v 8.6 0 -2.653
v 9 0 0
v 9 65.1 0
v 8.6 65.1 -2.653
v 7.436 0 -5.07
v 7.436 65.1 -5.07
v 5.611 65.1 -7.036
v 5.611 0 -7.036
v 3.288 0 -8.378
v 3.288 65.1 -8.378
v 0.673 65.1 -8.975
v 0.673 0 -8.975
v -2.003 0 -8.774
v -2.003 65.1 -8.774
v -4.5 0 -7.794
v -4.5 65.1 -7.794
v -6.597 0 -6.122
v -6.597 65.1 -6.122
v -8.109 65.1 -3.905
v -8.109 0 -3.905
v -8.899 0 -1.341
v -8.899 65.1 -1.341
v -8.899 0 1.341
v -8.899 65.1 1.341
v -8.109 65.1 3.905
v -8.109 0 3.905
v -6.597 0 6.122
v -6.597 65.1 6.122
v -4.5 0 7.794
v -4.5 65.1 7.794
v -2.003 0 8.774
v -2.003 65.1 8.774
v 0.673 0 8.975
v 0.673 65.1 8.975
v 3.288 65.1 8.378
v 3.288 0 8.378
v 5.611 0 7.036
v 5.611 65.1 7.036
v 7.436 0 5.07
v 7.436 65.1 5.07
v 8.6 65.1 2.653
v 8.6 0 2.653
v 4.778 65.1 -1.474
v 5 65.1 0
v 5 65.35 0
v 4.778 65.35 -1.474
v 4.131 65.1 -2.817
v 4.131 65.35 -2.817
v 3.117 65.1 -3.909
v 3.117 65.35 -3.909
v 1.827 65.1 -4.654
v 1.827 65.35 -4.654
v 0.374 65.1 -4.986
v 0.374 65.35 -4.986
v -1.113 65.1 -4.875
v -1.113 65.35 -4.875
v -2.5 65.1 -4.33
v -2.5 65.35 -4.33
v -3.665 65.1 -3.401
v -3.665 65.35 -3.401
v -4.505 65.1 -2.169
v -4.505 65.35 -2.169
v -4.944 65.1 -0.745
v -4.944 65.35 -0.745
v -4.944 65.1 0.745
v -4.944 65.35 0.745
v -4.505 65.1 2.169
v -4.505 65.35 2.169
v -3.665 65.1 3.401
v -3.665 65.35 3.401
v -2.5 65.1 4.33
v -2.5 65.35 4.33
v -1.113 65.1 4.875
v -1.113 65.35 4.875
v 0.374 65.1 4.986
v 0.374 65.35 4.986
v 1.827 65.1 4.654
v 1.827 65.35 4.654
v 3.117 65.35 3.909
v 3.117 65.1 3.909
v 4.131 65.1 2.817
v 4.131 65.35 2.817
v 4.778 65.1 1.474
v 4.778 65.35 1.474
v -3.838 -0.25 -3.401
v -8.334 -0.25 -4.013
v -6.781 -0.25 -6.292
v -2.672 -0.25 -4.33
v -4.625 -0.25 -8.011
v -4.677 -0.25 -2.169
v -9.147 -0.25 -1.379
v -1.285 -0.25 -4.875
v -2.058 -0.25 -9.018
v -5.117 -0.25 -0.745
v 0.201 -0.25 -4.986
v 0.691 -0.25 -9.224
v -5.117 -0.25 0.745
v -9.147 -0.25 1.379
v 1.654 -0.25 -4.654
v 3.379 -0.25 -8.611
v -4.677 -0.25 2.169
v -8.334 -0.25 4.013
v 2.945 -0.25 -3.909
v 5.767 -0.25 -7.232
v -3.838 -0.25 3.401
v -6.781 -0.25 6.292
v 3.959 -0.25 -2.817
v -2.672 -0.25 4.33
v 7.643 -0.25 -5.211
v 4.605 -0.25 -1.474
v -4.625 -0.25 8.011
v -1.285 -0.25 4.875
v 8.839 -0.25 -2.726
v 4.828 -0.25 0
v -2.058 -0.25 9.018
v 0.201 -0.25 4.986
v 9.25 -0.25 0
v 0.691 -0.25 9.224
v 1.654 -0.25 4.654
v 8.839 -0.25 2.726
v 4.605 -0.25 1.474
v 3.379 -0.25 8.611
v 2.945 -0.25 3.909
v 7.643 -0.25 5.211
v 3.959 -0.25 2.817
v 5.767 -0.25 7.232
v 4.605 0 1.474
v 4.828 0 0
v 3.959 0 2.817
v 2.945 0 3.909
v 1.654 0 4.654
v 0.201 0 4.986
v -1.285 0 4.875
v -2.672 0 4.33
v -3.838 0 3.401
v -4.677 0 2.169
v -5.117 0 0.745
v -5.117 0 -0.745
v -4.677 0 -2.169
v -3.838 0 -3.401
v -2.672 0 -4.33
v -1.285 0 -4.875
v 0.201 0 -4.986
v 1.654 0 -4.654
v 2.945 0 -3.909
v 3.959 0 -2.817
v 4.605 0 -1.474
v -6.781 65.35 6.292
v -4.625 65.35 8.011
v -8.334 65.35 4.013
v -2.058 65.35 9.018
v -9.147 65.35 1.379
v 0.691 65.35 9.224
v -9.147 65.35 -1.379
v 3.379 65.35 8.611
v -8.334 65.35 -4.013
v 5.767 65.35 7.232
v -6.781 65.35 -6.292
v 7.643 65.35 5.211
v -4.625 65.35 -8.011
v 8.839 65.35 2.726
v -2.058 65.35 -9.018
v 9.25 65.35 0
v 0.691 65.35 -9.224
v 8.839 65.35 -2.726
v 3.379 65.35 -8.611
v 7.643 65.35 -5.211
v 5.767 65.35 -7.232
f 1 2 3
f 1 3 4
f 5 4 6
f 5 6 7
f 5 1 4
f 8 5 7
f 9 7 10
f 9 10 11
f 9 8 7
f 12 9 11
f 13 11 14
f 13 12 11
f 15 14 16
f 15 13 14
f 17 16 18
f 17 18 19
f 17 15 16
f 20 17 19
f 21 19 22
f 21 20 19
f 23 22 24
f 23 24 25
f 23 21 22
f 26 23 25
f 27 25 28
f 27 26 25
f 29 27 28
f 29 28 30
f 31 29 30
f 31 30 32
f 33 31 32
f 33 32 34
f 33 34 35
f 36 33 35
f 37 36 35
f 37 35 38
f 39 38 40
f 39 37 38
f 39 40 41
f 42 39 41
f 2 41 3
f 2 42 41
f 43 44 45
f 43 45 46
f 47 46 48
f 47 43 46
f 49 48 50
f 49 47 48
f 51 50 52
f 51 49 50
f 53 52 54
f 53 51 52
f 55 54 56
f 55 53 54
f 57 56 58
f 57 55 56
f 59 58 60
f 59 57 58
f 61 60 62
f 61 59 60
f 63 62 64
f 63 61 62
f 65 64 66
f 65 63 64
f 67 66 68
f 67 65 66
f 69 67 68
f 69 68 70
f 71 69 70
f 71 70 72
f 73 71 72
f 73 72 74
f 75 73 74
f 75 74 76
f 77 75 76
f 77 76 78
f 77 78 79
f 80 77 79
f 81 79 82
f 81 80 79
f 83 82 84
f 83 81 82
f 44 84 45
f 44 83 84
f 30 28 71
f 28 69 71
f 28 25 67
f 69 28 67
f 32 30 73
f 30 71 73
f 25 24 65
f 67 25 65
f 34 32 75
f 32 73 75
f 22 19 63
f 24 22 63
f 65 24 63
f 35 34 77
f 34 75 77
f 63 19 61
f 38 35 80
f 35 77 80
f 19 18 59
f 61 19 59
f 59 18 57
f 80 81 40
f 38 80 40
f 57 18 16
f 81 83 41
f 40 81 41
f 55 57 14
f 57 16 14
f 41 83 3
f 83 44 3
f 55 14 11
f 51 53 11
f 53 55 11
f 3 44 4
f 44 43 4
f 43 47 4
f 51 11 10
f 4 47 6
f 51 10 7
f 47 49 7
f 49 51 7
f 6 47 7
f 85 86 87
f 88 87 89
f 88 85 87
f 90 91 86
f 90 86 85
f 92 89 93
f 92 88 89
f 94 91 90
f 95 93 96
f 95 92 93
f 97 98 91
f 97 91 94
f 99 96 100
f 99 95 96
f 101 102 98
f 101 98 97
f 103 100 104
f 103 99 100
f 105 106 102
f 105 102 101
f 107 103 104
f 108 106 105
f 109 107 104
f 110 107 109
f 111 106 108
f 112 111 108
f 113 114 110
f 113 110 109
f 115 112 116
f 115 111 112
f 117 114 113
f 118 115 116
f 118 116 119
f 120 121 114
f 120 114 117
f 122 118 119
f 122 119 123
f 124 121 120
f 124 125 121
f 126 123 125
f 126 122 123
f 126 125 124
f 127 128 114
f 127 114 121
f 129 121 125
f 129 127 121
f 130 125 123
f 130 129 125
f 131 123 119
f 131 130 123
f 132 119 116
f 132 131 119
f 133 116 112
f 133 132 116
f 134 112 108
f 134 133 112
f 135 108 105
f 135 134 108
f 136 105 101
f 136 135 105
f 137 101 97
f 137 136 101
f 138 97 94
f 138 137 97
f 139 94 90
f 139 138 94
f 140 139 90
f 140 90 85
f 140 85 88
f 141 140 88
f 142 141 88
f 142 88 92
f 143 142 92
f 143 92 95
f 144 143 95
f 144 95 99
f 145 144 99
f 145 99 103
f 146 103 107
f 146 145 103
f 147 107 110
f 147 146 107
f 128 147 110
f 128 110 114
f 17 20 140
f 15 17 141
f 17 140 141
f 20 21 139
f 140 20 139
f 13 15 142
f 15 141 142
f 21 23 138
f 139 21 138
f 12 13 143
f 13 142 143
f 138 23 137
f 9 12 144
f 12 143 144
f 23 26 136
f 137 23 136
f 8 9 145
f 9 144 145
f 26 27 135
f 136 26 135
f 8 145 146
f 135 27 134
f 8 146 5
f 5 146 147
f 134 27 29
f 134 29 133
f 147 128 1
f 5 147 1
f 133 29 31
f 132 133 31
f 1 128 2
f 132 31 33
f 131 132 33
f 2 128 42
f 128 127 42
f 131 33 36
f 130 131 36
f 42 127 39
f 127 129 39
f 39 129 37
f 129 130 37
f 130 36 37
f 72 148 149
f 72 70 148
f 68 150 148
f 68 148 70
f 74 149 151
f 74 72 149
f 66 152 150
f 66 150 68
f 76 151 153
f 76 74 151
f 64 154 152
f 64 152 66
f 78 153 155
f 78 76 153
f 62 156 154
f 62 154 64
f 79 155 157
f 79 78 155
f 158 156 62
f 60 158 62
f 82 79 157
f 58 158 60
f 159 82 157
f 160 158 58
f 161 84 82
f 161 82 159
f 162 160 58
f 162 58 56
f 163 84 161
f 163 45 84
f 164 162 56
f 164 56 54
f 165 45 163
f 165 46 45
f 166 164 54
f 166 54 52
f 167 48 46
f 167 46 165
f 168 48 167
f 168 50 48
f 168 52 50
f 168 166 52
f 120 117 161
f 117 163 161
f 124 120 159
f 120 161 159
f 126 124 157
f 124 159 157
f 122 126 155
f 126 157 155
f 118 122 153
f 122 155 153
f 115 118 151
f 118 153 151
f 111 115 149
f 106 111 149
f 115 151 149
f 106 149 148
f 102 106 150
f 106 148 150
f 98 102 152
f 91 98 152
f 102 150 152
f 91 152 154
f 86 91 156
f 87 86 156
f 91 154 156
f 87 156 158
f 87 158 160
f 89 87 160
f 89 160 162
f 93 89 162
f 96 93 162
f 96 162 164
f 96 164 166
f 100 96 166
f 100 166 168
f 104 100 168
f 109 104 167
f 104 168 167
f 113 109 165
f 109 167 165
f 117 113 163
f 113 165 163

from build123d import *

# Parameters (mm, degrees)
SKETCH1_R           = 9.25
SKETCH1_R_2         = 9
BOSS_EXTRUDE1_DEPTH = 65.1
SKETCH2_R           = 9.25
SKETCH2_R_2         = 5
BOSS_EXTRUDE2_DEPTH = 0.25
SKETCH3_R           = 9.25
SKETCH3_R_2         = 5
BOSS_EXTRUDE3_DEPTH = 0.25


with BuildPart() as part:
    # Sketch1 → Boss-Extrude1 (new body)
    with BuildSketch(Plane(origin=(0, 0, 0), x_dir=(1, 0, 0), z_dir=(0, 1, 0))):
        Circle(SKETCH1_R)
        Circle(SKETCH1_R_2, mode=Mode.SUBTRACT)
    extrude(amount=BOSS_EXTRUDE1_DEPTH)

    # Sketch2 → Boss-Extrude2 (add)
    with BuildSketch(Plane(origin=(0, 65.1, 0), x_dir=(1, 0, 0), z_dir=(0, 1, 0))):
        Circle(SKETCH2_R)
        Circle(SKETCH2_R_2, mode=Mode.SUBTRACT)
    extrude(amount=BOSS_EXTRUDE2_DEPTH)

    # Sketch3 → Boss-Extrude3 (add)
    with BuildSketch(Plane.XZ):
        Circle(SKETCH3_R)
        with Locations((-0.172396434, 0)):
            Circle(SKETCH3_R_2, mode=Mode.SUBTRACT)
    extrude(amount=BOSS_EXTRUDE3_DEPTH)


solid = part.part
